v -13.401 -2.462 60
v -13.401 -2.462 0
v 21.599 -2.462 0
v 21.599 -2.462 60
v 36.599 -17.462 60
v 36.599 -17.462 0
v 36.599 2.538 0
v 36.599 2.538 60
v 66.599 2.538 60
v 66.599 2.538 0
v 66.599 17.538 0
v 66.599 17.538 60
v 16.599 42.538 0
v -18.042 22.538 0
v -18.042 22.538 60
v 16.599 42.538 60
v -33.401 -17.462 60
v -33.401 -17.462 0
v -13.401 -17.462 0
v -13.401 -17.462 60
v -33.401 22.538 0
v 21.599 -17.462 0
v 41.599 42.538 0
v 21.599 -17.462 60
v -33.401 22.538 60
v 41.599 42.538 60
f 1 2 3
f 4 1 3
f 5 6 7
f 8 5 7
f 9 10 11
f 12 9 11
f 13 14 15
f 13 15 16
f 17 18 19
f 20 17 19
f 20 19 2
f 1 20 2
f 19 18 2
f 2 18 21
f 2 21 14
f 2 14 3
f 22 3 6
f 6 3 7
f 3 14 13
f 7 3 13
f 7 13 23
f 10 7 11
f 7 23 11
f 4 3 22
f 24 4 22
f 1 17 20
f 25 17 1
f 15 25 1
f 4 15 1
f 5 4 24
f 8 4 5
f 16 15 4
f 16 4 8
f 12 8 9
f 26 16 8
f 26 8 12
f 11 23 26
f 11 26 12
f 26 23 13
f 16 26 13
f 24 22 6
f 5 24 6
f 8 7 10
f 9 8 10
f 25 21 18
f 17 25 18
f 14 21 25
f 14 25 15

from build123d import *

# Parameters (mm, degrees)
F1_DEPTH = 60
F3_DEPTH = 25
F4_DEPTH = 78


with BuildPart() as f1:
    # F0 (on Top) → F1 (new body)
    with BuildSketch(Plane.XY):
        Polygon((66.599292, 42.537525), (-33.400708, 42.537525), (-33.400708, -17.462475), (-13.400708, -17.462475), (-13.400708, -2.462475), (21.599292, -2.462475), (21.599292, -17.462475), (36.599292, -17.462475), (36.599292, 2.537525), (66.599292, 2.537525), align=None)
    extrude(amount=F1_DEPTH)

    # F2 (on Top) → F3 (join)
    with BuildSketch(Plane.XY):
        Polygon((66.599292, 17.537525), (66.599292, 42.537525), (41.599292, 42.537525), align=None)
        Polygon((16.599292, 42.537525), (-33.400708, 42.537525), (-33.400708, 23.578404), (-33.400708, 22.537525), (-18.041724, 22.537525), align=None)
    extrude(amount=F3_DEPTH)

    # F2 (on Top) → F4 (cut)
    with BuildSketch(Plane.XY):
        Polygon((66.599292, 17.537525), (66.599292, 42.537525), (41.599292, 42.537525), align=None)
        Polygon((16.599292, 42.537525), (-33.400708, 42.537525), (-33.400708, 23.578404), (-33.400708, 22.537525), (-18.041724, 22.537525), align=None)
    extrude(amount=F4_DEPTH, mode=Mode.SUBTRACT)


solid = f1.part
